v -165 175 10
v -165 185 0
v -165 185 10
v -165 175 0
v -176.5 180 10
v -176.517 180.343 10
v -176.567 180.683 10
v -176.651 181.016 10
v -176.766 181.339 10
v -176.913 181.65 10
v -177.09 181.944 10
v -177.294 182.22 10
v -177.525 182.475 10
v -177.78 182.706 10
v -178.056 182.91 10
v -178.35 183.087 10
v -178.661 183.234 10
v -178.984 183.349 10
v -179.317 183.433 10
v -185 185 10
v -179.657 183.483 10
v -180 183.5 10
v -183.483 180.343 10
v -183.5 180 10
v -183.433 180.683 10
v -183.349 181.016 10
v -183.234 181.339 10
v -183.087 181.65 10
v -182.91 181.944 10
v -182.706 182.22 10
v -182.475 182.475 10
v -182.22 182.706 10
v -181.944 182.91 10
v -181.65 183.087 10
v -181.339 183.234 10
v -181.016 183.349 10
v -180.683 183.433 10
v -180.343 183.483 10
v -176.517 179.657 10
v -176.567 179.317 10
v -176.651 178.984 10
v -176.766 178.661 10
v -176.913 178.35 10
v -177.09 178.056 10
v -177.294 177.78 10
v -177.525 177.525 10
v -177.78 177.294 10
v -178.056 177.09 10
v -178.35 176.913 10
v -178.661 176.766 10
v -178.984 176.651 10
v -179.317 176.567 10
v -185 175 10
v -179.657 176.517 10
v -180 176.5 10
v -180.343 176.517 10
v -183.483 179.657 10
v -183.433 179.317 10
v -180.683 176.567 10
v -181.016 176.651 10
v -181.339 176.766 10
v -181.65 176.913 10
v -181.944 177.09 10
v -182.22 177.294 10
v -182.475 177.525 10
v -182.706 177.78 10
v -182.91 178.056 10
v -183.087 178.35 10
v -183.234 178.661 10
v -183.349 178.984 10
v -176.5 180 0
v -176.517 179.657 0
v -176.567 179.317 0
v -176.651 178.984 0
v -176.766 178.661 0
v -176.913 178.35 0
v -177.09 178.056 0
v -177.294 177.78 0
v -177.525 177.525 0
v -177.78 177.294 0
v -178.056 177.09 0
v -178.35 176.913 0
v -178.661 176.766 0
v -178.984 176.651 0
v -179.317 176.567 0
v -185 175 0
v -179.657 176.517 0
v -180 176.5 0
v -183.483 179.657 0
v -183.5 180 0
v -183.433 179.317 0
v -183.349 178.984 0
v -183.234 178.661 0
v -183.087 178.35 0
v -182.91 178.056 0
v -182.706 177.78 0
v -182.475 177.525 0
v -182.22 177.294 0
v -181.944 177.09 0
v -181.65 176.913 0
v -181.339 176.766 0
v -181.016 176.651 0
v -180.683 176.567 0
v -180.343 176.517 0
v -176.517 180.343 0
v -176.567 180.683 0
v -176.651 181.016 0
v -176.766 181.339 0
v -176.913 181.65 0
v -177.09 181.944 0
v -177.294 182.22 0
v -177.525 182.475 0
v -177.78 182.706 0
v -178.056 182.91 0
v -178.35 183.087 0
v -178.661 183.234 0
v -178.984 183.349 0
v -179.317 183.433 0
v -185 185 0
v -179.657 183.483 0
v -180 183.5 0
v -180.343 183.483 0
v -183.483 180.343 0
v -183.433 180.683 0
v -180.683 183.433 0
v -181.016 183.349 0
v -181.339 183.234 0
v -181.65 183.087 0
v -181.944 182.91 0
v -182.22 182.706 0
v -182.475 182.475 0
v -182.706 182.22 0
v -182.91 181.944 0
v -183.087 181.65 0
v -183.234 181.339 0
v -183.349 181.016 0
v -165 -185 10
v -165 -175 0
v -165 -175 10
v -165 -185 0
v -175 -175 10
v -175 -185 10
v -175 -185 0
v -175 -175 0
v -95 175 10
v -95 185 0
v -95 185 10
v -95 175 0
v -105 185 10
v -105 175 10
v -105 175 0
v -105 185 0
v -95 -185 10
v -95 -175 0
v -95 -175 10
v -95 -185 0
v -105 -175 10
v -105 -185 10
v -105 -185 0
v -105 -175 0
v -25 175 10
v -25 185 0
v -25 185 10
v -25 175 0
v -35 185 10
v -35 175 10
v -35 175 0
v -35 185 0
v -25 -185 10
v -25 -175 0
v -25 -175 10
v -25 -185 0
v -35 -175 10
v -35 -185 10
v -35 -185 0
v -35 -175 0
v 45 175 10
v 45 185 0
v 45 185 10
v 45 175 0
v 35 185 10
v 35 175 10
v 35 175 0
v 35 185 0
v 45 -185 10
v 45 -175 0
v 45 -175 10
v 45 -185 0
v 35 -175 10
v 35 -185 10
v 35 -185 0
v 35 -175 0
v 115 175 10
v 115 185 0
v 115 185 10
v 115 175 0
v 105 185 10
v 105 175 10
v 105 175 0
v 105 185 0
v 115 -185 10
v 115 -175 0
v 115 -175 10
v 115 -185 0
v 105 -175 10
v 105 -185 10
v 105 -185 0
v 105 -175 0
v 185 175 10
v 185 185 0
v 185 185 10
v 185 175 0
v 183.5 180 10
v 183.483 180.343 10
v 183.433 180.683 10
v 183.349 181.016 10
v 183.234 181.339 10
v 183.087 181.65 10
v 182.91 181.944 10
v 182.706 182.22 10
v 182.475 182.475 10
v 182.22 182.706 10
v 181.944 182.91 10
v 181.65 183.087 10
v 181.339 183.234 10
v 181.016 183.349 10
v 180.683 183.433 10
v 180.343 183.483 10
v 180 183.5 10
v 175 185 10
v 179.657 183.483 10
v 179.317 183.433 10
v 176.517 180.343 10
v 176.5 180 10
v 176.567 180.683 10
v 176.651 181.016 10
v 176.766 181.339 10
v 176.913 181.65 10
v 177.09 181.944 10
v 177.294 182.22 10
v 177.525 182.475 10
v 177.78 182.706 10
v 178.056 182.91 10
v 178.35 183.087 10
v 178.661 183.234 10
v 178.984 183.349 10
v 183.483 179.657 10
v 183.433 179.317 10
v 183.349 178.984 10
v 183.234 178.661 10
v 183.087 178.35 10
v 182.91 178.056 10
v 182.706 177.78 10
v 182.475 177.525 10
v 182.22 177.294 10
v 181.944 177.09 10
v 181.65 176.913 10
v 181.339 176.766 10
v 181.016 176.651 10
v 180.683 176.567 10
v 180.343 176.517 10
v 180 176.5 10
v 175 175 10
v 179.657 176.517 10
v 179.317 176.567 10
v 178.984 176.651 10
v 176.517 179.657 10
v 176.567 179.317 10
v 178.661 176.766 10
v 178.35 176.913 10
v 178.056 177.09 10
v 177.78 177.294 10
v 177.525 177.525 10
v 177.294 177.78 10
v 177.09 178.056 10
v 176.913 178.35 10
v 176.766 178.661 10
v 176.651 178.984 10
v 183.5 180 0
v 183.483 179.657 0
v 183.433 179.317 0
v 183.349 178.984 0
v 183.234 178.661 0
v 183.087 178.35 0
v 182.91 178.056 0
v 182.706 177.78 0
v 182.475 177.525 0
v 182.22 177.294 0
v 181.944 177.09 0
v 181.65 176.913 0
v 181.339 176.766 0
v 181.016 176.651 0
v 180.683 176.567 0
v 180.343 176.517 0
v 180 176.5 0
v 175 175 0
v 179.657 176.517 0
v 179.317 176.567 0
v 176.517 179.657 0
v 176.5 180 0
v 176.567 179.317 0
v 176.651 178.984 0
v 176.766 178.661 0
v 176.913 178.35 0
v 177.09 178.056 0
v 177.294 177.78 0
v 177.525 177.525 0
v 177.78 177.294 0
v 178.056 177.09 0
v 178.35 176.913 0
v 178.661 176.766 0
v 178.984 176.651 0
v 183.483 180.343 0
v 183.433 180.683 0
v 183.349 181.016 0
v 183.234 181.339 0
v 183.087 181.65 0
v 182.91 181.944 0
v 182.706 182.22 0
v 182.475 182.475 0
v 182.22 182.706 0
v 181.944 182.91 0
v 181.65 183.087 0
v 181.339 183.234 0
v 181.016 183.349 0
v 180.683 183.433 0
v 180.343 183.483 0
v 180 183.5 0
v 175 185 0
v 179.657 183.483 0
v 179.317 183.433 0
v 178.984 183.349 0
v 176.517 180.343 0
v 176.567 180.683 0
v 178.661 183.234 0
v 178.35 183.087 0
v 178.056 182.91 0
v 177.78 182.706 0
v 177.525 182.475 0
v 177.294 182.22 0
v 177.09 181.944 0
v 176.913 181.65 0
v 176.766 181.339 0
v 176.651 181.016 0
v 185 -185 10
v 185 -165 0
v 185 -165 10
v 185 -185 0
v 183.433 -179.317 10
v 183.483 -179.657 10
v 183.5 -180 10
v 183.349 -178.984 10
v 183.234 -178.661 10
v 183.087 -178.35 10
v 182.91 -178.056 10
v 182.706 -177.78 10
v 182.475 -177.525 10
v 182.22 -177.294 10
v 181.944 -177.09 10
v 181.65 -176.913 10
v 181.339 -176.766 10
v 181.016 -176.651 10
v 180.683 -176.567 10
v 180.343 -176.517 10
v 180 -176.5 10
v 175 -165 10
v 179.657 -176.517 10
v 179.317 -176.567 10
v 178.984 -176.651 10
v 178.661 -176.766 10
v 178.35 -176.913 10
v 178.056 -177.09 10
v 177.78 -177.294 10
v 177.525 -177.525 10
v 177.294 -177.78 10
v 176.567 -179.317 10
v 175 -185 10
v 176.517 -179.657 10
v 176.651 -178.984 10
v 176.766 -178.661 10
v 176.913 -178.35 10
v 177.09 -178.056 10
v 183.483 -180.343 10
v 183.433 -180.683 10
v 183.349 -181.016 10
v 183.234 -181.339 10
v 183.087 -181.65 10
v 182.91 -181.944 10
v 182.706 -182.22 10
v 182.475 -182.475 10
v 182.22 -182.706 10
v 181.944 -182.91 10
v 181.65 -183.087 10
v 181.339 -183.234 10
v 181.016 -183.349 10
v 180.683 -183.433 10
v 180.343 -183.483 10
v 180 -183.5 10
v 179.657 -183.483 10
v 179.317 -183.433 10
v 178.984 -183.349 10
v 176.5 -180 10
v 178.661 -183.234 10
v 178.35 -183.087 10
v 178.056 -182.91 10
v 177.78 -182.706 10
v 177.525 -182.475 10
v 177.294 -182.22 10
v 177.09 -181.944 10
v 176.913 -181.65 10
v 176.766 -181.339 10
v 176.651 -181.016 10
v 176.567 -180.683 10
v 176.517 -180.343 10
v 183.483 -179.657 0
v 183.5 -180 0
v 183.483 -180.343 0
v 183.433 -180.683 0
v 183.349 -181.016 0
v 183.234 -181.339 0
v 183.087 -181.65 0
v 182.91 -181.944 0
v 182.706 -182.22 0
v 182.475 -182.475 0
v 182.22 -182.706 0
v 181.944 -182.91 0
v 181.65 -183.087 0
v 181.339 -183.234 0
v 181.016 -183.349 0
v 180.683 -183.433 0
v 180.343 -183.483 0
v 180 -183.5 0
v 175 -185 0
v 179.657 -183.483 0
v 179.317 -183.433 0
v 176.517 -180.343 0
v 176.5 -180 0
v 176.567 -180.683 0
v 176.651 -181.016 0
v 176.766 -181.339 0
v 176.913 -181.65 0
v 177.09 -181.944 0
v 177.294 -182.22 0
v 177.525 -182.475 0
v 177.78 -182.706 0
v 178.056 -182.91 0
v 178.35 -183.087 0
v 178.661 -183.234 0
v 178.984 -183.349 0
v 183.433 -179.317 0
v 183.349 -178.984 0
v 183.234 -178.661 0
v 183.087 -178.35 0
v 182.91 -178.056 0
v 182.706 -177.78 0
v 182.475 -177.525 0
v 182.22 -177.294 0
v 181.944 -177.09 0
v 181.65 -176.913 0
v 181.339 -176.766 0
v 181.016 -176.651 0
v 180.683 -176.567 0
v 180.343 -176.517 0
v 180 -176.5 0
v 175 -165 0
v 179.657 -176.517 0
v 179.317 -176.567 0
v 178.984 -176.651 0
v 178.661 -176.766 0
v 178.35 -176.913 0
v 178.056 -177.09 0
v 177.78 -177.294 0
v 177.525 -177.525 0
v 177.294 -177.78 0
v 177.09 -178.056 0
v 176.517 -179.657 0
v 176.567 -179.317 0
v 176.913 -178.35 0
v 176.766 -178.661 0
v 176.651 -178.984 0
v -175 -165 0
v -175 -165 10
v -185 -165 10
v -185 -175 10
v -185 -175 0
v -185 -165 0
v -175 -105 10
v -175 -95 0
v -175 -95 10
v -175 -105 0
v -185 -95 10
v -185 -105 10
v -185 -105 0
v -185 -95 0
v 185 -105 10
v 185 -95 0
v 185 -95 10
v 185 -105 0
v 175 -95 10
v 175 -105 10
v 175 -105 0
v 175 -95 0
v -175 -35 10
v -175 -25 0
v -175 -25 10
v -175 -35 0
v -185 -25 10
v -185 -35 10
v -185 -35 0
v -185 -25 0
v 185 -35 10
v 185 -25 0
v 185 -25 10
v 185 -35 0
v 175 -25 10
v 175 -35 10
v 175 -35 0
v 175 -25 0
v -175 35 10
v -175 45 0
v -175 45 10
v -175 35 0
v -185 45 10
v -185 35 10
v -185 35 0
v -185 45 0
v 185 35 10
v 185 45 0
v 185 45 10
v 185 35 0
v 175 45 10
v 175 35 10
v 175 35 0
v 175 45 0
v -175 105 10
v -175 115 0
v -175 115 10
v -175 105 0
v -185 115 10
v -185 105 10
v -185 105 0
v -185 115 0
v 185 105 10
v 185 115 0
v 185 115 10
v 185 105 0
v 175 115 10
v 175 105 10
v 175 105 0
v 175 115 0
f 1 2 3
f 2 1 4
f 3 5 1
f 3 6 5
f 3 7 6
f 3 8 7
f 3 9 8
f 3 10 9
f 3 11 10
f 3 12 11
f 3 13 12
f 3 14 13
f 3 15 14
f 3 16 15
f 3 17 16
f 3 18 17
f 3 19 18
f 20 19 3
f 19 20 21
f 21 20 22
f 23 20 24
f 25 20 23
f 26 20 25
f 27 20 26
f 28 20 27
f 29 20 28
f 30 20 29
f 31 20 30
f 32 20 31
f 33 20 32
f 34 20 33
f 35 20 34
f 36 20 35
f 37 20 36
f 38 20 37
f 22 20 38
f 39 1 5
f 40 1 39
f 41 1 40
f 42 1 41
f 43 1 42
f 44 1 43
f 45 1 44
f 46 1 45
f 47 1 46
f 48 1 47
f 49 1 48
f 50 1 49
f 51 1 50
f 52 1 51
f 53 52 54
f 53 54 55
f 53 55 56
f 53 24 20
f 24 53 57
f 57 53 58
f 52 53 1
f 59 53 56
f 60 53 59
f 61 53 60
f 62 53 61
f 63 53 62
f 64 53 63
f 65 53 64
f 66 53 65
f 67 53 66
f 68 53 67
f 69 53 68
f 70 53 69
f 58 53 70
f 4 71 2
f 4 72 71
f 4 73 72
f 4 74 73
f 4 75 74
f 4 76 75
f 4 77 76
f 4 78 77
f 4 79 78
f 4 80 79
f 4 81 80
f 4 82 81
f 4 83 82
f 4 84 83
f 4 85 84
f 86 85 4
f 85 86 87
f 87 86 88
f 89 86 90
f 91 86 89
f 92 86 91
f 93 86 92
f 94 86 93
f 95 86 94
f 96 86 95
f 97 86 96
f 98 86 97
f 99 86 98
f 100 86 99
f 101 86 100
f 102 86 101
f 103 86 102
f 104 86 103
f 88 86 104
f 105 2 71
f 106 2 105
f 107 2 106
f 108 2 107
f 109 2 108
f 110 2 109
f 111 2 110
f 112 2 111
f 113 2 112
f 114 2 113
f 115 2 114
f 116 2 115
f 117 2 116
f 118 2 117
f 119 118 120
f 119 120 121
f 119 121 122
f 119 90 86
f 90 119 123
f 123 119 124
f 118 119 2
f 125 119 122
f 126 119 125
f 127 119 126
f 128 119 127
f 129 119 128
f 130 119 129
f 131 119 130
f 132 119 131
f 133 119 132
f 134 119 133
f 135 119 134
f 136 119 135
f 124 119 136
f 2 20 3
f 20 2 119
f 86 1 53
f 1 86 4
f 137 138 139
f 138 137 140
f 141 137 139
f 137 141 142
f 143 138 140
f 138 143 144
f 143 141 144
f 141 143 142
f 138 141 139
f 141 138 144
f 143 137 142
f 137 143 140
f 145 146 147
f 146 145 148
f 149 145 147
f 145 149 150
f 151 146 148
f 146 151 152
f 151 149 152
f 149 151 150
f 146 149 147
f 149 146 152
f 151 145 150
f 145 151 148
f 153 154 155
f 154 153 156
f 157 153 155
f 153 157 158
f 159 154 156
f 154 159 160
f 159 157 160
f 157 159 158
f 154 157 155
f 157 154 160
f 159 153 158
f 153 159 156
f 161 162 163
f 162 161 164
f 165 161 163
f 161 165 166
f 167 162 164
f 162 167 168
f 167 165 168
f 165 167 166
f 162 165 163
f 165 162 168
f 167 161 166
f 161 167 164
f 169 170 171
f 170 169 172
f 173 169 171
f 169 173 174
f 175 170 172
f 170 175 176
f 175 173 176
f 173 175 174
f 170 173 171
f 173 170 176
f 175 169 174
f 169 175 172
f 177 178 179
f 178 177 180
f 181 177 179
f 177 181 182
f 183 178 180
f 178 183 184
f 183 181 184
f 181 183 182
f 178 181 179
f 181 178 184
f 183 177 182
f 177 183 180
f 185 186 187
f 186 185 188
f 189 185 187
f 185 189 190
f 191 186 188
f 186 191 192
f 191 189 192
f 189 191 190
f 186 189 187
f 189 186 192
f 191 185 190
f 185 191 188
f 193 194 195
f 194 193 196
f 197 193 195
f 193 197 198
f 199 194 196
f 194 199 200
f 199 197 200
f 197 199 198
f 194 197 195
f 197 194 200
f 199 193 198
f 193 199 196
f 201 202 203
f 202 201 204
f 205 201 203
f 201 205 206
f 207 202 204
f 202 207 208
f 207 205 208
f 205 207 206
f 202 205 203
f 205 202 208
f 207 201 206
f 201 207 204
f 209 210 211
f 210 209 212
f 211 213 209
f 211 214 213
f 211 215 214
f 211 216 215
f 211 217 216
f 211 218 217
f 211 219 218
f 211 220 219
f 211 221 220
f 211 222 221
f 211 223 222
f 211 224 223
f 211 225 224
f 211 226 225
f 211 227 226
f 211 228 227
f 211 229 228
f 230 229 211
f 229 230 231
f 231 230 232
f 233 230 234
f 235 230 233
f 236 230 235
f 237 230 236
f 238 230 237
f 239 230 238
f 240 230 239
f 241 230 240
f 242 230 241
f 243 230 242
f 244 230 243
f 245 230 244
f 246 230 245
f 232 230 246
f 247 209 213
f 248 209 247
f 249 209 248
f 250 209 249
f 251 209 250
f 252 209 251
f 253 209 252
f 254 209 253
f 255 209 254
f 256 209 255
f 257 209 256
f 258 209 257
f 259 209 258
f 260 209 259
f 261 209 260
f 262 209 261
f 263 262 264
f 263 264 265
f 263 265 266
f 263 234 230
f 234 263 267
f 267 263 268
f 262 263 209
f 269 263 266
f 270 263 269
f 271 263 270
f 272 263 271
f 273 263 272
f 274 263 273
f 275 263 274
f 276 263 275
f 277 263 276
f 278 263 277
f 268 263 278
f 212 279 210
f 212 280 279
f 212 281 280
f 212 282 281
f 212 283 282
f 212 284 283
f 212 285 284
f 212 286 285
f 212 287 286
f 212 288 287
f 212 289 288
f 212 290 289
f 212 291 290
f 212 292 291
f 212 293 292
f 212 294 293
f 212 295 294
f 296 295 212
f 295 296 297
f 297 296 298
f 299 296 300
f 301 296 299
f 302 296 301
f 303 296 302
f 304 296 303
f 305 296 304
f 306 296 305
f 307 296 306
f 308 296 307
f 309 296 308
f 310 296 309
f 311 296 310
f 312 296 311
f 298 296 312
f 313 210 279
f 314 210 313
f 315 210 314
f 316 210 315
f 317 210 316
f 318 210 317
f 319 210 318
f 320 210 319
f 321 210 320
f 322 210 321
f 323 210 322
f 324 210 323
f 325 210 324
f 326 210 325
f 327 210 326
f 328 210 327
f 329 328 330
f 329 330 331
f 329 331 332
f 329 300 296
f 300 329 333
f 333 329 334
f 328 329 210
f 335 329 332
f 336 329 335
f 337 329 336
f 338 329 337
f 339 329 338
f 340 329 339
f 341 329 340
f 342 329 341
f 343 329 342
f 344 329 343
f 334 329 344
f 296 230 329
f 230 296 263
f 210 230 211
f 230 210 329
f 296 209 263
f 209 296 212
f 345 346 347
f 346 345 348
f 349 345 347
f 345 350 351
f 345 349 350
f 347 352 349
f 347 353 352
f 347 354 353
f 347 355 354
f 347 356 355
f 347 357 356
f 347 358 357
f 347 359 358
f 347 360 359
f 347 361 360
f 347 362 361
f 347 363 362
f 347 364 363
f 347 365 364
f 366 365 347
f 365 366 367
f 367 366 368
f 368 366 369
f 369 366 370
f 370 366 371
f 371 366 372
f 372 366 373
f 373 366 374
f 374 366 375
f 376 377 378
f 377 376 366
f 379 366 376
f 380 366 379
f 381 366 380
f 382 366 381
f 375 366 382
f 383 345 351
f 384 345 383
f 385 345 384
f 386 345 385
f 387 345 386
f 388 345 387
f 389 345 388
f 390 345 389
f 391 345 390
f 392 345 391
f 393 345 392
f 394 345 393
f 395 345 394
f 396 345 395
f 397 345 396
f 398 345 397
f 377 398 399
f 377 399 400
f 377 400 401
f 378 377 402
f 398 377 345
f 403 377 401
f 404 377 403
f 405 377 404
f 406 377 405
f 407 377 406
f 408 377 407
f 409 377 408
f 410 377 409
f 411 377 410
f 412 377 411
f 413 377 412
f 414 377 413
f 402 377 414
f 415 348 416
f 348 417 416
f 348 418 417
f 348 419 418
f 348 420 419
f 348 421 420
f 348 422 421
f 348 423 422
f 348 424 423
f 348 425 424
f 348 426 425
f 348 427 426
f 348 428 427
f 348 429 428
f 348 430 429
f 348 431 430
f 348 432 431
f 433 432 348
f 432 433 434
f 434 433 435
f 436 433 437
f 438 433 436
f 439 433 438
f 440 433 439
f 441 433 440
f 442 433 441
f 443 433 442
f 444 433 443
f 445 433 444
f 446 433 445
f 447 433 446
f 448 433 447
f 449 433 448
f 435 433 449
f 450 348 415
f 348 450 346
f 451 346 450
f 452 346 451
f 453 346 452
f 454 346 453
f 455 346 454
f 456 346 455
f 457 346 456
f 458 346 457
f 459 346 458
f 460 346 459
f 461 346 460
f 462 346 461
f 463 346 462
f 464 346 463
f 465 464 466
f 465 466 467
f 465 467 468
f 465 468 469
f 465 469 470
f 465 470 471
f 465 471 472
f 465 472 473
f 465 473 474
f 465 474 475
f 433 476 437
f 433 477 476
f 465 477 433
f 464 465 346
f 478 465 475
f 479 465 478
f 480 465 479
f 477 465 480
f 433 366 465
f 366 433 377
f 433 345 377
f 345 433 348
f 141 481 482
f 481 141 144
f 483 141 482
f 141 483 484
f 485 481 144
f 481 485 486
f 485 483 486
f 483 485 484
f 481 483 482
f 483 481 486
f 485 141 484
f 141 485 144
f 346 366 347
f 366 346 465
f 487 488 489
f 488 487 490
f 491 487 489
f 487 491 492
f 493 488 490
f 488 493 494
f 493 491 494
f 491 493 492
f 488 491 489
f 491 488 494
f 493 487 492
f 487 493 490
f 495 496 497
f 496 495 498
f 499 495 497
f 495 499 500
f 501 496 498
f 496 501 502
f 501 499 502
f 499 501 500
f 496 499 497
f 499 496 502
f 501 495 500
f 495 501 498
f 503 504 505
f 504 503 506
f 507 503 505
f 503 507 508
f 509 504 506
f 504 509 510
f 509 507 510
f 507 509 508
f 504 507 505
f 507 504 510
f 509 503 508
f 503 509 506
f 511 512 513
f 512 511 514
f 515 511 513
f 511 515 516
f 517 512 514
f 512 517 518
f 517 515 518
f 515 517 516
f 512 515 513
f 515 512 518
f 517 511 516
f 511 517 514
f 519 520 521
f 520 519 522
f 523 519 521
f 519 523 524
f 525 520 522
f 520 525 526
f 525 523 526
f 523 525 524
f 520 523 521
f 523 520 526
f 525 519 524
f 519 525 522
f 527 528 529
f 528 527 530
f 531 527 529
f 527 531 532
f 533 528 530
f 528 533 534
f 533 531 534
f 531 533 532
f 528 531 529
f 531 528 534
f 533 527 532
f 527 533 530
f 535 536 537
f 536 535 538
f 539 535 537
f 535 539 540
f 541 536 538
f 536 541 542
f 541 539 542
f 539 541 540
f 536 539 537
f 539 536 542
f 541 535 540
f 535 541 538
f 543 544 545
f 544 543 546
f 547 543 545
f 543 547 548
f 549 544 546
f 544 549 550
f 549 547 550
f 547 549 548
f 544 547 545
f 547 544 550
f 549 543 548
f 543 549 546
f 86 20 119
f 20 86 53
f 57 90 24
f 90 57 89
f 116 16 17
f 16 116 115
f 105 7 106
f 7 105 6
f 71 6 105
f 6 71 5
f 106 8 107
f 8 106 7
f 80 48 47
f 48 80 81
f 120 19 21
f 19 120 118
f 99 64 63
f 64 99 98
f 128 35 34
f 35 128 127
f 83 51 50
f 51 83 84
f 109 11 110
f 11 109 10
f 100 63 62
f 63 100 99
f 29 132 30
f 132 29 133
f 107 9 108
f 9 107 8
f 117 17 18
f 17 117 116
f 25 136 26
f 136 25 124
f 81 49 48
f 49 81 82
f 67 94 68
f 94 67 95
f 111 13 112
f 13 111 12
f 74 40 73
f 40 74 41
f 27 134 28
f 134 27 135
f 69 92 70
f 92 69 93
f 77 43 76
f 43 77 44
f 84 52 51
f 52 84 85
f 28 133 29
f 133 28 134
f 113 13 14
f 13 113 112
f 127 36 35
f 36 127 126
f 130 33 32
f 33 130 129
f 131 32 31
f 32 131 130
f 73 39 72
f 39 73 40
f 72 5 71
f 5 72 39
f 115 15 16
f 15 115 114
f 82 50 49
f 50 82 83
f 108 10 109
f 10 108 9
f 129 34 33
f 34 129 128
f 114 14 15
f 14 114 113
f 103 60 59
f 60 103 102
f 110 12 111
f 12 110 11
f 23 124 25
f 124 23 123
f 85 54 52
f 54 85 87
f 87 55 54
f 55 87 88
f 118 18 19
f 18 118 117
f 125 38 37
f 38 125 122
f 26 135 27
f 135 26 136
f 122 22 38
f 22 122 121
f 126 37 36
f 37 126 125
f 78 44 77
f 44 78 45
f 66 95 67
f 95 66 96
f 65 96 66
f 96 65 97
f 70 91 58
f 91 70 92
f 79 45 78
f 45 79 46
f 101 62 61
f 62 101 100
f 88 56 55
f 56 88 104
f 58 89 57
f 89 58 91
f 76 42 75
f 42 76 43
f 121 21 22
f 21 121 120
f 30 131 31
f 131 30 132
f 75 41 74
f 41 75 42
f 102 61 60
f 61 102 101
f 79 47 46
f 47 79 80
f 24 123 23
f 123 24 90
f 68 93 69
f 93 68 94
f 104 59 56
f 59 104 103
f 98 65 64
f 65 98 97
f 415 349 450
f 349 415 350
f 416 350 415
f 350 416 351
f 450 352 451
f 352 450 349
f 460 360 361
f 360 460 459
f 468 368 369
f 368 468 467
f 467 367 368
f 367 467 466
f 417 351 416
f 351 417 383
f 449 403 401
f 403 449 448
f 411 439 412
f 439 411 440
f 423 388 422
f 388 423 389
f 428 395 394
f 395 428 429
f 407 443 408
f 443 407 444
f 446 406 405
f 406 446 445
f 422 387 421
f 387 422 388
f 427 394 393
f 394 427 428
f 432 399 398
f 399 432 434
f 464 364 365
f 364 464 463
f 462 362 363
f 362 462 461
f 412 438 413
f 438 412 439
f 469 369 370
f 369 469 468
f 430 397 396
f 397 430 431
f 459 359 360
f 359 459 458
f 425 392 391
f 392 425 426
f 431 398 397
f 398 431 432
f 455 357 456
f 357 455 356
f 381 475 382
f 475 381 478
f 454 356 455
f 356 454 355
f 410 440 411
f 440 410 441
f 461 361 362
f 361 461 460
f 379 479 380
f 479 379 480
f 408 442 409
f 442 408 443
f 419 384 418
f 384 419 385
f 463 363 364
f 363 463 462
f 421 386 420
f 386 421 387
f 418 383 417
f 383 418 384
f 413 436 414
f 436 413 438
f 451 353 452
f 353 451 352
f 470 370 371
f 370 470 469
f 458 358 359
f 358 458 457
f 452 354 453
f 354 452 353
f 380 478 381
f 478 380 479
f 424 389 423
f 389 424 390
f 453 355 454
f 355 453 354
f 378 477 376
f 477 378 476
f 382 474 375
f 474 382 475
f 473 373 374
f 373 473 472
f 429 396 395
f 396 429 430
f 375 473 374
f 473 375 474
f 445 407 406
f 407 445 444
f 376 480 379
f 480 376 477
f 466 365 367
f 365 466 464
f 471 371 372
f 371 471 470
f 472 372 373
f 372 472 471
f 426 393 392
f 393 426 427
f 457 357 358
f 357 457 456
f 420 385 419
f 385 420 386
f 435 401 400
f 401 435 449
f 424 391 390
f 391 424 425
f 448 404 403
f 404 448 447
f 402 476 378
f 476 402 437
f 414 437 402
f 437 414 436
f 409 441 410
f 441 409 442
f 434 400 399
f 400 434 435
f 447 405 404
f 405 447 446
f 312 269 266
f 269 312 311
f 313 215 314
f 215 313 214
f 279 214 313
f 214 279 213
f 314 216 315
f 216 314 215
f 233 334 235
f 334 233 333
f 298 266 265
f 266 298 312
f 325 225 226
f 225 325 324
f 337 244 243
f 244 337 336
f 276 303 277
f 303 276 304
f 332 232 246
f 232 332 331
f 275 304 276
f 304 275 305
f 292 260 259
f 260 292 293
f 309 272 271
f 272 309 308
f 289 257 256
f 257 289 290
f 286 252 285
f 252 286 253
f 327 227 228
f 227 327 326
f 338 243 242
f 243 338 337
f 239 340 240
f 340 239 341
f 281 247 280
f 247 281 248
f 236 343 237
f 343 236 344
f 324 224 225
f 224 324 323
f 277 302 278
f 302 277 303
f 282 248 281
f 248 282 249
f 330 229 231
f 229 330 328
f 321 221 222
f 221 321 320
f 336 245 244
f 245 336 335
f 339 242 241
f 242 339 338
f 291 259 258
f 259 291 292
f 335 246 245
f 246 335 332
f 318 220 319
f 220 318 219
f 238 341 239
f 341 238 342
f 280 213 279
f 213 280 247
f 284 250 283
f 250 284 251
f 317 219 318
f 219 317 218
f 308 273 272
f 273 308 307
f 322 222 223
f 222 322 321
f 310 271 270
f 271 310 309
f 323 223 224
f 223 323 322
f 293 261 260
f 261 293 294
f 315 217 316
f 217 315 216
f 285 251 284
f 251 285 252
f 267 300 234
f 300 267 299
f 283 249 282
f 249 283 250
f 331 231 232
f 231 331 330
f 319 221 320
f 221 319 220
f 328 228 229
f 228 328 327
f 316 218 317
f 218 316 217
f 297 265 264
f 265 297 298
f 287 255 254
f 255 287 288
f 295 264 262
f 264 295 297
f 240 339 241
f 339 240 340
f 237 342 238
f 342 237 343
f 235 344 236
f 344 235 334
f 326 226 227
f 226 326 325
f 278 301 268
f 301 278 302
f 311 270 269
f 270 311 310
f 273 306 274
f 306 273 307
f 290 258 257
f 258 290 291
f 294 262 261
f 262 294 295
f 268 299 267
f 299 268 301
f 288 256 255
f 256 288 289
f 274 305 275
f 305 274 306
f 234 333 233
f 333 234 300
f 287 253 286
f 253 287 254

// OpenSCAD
// ring_24.scad - ring index 24 (z bottom = 240 mm)
$fn = 64; bar = 10; half_b = bar/2; outer = 370; half_outer = outer/2;
front_y = 180; back_y = -180; left_x = -180; right_x = 180;
x_centers = [-170, -100, -30, 40, 110, 180];
z_centers = [5, 85, 155, 225, 295, 365, 435, 505, 575, 645, 715]; ring_z = 240;
module place_box(cx, cy, sx, sy) { translate([cx - sx/2, cy - sy/2, 0]) cube([sx, sy, bar]); }

difference() { union() {
    for (x = x_centers) { place_box(x, front_y, bar, bar); place_box(x, back_y, bar, bar); }
    for (y = x_centers) { place_box(left_x, y, bar, bar); place_box(right_x, y, bar, bar); }
    for (zc = z_centers) if ((zc - half_b < ring_z + bar) && (zc + half_b > ring_z)) {
        translate([-half_outer, front_y - half_b, 0]) cube([outer, bar, bar]);
        translate([-half_outer, back_y - half_b, 0])  cube([outer, bar, bar]);
        translate([left_x - half_b, -half_outer, 0])  cube([bar, outer, bar]);
        translate([right_x - half_b, -half_outer, 0]) cube([bar, outer, bar]);
    }
  }
  for (cx = [-180, 180]) for (cy = [-180, 180]) translate([cx, cy, 0]) cylinder(h = bar, r = 3.5, $fn = 64);
}
